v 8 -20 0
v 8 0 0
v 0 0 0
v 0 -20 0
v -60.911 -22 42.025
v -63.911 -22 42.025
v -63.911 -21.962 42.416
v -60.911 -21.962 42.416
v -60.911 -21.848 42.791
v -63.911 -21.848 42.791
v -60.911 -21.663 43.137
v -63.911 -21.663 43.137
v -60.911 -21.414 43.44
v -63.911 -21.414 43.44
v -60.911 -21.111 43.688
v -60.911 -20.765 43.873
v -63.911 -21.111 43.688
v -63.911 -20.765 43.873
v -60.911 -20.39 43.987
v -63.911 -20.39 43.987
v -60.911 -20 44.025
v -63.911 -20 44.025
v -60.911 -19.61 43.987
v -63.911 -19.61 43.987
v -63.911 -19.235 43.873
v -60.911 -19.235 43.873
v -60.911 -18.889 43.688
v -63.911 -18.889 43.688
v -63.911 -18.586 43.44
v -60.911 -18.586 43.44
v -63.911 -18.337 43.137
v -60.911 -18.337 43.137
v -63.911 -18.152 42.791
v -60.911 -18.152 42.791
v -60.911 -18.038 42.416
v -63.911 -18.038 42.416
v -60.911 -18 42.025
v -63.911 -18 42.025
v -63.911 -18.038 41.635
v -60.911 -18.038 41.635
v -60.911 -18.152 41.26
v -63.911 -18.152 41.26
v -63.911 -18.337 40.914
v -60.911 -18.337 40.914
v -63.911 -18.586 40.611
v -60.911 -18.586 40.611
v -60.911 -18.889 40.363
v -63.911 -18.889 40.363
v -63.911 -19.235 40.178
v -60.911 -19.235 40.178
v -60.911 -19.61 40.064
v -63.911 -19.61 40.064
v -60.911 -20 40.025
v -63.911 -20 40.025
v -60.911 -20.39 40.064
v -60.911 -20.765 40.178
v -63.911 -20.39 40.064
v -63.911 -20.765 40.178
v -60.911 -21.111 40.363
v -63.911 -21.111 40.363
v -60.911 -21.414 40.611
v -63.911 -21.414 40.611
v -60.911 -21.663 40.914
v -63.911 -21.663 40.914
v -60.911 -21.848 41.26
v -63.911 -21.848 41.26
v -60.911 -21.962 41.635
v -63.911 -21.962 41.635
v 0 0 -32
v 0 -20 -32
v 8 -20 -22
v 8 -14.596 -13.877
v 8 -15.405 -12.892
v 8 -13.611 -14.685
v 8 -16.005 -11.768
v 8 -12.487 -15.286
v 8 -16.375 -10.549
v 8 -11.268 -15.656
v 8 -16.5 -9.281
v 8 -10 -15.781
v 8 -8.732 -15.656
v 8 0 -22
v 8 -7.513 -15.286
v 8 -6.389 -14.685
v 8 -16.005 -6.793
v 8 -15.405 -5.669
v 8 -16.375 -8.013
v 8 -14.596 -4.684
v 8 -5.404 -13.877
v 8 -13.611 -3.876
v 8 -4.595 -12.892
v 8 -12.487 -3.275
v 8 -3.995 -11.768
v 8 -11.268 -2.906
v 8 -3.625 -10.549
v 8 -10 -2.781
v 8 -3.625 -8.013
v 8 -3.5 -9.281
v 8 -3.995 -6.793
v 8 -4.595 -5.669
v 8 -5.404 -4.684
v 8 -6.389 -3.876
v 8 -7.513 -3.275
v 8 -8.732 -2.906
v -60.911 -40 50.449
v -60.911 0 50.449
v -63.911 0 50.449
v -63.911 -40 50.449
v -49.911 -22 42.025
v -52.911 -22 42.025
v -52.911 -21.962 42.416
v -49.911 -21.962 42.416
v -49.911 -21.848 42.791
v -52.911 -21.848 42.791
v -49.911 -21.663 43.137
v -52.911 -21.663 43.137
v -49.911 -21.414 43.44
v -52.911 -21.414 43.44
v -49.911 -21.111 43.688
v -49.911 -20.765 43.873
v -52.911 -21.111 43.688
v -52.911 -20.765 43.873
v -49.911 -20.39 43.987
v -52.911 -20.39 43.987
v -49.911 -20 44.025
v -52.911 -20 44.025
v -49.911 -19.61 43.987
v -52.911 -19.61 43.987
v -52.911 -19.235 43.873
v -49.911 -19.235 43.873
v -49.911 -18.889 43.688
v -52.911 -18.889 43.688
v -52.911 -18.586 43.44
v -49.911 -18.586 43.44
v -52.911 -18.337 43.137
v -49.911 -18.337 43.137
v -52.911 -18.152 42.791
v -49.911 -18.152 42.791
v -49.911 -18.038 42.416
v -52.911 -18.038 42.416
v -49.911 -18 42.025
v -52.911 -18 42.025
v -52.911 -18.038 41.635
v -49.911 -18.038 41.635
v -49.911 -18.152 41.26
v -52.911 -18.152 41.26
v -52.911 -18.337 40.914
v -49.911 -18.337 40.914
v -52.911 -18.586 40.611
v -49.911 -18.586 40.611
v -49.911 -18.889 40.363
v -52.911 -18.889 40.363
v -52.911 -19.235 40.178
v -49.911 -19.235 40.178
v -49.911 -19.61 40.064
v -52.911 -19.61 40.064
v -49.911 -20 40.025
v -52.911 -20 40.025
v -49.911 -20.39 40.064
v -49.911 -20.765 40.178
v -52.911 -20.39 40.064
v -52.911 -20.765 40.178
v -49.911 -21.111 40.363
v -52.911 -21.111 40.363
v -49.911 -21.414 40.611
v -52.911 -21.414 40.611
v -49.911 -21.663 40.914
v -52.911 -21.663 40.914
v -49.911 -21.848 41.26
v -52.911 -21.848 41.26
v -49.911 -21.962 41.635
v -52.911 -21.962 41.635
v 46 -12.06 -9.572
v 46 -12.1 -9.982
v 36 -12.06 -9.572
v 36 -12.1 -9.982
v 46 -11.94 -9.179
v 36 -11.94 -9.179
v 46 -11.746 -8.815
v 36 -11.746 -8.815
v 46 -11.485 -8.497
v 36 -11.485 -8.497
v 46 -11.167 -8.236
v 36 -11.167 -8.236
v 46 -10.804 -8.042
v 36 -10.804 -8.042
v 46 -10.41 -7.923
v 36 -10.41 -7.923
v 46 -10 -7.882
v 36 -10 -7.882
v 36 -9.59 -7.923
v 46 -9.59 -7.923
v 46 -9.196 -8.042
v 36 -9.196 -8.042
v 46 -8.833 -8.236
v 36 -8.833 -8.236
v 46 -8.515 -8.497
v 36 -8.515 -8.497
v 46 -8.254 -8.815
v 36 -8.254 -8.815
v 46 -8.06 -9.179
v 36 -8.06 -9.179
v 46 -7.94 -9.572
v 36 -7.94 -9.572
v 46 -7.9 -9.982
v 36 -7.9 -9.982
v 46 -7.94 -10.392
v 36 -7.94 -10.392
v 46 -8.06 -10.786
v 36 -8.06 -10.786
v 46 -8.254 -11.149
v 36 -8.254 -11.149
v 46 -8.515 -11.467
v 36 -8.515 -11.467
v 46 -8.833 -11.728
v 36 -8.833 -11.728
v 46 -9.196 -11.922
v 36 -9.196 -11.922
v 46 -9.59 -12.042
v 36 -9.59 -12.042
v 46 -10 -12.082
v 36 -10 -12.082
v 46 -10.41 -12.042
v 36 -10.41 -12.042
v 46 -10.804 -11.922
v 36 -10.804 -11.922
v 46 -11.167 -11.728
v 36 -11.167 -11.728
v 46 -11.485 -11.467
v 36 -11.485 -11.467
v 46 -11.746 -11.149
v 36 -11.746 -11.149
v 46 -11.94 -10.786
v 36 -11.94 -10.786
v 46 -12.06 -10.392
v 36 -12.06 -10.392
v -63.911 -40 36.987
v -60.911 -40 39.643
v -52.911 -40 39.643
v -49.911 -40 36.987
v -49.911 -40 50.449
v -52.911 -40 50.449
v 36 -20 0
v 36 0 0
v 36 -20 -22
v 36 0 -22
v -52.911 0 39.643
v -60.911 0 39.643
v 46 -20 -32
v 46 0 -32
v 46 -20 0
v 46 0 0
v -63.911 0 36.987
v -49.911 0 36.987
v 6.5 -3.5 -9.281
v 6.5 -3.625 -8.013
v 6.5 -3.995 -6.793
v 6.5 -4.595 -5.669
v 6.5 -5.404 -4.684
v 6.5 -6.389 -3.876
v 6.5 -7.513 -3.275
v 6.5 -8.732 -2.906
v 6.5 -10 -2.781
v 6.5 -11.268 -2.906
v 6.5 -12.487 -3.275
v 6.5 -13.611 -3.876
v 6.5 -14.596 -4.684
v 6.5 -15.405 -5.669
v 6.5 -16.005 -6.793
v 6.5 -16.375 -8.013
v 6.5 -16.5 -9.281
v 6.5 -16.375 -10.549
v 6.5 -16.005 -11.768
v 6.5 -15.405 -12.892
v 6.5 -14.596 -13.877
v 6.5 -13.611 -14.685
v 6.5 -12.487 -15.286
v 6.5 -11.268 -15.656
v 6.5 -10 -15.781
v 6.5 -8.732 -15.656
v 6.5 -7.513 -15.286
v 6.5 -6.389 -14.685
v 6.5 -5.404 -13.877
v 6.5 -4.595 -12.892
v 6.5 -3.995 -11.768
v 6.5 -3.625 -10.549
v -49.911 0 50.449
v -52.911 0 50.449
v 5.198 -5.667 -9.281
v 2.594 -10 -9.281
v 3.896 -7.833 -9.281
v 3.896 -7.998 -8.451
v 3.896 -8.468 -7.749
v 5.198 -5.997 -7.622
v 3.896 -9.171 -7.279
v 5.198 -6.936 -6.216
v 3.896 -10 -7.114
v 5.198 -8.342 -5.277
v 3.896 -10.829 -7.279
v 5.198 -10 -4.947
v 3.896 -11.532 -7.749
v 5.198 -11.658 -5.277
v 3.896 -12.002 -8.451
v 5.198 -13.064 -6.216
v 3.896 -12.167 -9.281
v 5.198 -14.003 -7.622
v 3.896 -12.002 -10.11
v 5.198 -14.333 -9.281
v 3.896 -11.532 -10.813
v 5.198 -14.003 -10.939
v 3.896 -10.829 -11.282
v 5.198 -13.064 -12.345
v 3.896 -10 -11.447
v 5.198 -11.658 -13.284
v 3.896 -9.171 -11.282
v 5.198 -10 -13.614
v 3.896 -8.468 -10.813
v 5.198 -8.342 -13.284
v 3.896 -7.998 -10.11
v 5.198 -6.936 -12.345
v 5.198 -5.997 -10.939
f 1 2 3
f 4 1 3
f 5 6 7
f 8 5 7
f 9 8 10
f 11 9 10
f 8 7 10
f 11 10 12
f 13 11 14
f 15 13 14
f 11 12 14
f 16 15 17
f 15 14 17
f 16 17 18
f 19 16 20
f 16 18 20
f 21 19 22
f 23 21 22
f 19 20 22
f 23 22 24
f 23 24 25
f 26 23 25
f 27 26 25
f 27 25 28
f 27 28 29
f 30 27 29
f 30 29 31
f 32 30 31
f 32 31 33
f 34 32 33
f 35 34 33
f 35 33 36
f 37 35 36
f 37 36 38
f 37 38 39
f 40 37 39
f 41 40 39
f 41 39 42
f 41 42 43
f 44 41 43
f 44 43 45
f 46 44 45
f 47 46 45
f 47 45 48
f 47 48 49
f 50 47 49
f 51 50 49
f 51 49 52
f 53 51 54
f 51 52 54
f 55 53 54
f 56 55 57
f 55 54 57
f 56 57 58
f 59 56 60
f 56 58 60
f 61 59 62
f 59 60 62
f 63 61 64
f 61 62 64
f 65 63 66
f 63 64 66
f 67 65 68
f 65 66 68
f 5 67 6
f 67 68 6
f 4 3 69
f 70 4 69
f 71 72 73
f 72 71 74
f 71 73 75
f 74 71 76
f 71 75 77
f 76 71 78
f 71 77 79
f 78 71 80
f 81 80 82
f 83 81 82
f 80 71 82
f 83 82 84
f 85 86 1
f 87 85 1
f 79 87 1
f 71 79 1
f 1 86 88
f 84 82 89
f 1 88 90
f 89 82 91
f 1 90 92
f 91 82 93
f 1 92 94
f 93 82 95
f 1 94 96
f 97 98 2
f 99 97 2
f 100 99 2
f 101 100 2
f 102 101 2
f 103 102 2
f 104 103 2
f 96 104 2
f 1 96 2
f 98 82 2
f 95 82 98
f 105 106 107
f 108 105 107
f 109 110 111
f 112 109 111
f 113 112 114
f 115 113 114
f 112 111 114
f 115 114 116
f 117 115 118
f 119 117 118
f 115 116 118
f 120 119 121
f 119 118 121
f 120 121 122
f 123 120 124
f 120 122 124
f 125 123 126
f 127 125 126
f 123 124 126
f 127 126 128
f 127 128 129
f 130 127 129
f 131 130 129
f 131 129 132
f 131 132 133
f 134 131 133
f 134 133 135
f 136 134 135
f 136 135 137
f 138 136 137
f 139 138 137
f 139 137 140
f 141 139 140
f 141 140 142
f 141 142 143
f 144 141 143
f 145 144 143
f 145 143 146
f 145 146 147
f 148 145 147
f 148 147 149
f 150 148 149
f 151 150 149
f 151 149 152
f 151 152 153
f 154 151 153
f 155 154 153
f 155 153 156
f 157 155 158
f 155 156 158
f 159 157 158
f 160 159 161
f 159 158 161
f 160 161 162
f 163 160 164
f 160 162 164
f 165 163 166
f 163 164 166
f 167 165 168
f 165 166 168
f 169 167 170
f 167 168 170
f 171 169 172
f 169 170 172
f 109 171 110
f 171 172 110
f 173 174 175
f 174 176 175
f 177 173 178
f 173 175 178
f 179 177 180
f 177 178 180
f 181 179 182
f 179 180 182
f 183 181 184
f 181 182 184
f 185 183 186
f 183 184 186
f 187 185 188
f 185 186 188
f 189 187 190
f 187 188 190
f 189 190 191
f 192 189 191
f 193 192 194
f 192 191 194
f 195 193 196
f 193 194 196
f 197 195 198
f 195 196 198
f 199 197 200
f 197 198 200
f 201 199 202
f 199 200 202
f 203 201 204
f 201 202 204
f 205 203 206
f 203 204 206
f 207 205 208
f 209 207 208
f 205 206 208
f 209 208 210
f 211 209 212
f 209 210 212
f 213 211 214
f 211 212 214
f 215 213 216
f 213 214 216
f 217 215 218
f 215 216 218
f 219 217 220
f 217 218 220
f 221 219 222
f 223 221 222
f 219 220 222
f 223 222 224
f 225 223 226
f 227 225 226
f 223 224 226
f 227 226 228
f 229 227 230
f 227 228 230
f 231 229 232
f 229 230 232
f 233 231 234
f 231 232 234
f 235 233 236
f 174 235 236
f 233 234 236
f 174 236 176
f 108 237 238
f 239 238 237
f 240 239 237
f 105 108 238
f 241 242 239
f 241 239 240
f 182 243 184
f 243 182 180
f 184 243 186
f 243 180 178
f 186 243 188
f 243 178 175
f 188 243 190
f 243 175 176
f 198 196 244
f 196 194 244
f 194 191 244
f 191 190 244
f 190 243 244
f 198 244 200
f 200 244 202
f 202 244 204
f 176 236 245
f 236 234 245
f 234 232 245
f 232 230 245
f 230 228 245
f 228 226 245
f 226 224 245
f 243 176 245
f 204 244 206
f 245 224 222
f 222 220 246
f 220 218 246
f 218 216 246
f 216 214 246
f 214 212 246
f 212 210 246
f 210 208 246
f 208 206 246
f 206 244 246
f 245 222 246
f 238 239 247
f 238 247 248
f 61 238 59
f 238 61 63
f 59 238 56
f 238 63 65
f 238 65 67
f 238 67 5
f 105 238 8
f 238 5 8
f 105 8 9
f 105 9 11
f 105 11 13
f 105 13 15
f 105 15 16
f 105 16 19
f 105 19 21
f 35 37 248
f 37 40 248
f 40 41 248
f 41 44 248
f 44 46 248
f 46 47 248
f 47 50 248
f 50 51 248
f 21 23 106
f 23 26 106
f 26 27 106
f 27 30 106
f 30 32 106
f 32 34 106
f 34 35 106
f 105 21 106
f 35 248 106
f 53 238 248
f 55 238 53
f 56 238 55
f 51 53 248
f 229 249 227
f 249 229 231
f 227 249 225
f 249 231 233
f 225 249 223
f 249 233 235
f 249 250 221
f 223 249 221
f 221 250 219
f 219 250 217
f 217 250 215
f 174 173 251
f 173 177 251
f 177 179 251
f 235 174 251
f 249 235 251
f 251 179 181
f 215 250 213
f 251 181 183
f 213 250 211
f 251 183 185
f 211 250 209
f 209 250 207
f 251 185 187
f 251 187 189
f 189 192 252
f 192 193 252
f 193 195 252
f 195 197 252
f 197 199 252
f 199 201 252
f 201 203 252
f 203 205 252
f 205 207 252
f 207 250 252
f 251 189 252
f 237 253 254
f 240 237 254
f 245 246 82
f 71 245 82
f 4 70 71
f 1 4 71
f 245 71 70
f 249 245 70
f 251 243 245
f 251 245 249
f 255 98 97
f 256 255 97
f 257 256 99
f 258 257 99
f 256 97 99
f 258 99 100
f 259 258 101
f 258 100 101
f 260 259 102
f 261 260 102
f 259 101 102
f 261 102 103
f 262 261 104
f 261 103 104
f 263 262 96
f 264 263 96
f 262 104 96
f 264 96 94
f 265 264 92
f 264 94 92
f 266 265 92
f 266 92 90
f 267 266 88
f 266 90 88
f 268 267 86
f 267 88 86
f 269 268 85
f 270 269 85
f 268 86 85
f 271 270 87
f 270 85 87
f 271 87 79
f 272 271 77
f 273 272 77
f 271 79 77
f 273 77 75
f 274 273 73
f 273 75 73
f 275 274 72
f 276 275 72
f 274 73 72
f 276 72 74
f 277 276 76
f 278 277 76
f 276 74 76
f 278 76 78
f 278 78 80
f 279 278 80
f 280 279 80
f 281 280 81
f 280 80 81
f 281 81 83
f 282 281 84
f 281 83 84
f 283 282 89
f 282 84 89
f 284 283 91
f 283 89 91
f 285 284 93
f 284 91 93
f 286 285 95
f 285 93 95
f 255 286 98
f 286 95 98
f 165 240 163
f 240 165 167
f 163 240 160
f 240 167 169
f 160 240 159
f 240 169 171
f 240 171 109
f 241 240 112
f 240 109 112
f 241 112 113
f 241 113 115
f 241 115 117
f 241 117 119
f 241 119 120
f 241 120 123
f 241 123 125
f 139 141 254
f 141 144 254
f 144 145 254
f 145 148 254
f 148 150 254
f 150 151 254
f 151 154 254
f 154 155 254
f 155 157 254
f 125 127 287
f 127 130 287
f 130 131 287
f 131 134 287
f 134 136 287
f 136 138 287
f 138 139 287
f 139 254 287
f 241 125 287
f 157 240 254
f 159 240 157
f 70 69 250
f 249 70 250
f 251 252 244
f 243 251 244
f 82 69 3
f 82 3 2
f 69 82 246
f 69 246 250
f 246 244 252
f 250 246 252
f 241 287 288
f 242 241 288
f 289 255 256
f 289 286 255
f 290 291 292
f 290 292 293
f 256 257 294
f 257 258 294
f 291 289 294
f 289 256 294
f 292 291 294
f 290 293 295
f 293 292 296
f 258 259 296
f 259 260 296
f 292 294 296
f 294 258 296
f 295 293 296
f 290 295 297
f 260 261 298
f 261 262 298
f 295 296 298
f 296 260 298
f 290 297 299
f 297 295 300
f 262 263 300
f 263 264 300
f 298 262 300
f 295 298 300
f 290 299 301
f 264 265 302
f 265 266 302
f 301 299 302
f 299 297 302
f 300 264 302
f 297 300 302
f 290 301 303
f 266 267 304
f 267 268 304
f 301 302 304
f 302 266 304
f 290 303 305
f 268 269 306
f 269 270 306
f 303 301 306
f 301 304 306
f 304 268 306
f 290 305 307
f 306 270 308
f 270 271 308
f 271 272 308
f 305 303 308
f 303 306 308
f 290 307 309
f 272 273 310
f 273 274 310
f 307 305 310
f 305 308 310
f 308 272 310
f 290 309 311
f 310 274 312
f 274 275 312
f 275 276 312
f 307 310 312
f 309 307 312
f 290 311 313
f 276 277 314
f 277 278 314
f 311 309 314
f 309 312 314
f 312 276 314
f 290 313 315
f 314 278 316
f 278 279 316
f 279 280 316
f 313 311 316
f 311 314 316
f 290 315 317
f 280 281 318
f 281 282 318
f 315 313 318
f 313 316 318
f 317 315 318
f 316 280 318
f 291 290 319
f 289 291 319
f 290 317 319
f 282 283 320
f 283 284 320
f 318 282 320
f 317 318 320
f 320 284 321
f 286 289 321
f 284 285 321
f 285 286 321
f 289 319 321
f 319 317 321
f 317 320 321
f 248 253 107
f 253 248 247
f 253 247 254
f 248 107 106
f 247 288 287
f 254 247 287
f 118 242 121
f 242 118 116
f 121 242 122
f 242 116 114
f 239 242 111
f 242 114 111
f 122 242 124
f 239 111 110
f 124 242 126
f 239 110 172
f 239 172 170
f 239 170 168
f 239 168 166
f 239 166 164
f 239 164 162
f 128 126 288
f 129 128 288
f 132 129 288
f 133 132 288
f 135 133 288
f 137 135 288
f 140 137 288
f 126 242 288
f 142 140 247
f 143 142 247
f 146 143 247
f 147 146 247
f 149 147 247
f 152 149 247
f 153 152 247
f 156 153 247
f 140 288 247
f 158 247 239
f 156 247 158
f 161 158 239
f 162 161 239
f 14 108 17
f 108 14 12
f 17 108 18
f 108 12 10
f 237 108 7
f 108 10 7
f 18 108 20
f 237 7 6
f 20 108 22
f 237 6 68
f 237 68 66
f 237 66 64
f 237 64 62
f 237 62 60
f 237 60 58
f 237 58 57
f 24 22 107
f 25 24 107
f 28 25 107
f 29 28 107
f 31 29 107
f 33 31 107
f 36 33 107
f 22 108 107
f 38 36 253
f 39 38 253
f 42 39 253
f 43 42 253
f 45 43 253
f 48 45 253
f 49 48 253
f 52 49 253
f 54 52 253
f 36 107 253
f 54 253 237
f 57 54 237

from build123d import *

# Parameters (mm, degrees)
F1_DEPTH = 20
F3_D     = 13
F3_DEPTH = 1.5
F3_TIP   = 3.9055940237
F5_D     = 4.2
F5_DEPTH = 10
F5_TIP   = 1.2618073
F7_DEPTH = 40
F9_D     = 4


with BuildPart() as f1:
    # F0 (on Front) → F1 (new body)
    with BuildSketch(Plane.XZ):
        Polygon((8, 0), (0, 0), (0, -32), (46, -32), (46, 0), (36, 0), (36, -22), (8, -22), align=None)
    extrude(amount=F1_DEPTH)

    # F3 (one way)
    with BuildSketch(Plane.YZ.offset(8)):
        with Locations((-10, -9.2806210741)):
            Circle(F3_D / 2)
    extrude(amount=-F3_DEPTH, mode=Mode.SUBTRACT)
    with Locations(Plane.YZ.offset(8)):
        with Locations((-10, -9.2806210741)):
            with Locations((0, 0, -(F3_DEPTH + F3_TIP / 2))):  # 118° drill point
                Cone(0, F3_D / 2, F3_TIP, mode=Mode.SUBTRACT)

    # F5
    with Locations(Plane.YZ.offset(46)):
        with Locations((-10, -9.9821751937)):
            Hole(F5_D / 2, depth=F5_DEPTH)
            with Locations((0, 0, -(F5_DEPTH + F5_TIP / 2))):  # 118° drill point
                Cone(0, F5_D / 2, F5_TIP, mode=Mode.SUBTRACT)


with BuildPart() as f7:
    # F6 (on Front) → F7 (new body)
    with BuildSketch(Plane.XZ):
        Polygon((-60.9114952385, 50.4485665456), (-63.9114952385, 50.4485665456), (-63.9114952385, 36.9870328709), (-49.9114952385, 36.9870328709), (-49.9114952385, 50.4485665456), (-52.9114952385, 50.4485665456), (-52.9114952385, 39.6433845162), (-60.9114952385, 39.6433845162), align=None)
    extrude(amount=F7_DEPTH)

    # F9 (through all)
    with Locations(Plane.YZ.offset(-49.9114952385)):
        with Locations((-20, 42.0254990458)):
            Hole(F9_D / 2)


solid = Compound([f1.part, f7.part])
